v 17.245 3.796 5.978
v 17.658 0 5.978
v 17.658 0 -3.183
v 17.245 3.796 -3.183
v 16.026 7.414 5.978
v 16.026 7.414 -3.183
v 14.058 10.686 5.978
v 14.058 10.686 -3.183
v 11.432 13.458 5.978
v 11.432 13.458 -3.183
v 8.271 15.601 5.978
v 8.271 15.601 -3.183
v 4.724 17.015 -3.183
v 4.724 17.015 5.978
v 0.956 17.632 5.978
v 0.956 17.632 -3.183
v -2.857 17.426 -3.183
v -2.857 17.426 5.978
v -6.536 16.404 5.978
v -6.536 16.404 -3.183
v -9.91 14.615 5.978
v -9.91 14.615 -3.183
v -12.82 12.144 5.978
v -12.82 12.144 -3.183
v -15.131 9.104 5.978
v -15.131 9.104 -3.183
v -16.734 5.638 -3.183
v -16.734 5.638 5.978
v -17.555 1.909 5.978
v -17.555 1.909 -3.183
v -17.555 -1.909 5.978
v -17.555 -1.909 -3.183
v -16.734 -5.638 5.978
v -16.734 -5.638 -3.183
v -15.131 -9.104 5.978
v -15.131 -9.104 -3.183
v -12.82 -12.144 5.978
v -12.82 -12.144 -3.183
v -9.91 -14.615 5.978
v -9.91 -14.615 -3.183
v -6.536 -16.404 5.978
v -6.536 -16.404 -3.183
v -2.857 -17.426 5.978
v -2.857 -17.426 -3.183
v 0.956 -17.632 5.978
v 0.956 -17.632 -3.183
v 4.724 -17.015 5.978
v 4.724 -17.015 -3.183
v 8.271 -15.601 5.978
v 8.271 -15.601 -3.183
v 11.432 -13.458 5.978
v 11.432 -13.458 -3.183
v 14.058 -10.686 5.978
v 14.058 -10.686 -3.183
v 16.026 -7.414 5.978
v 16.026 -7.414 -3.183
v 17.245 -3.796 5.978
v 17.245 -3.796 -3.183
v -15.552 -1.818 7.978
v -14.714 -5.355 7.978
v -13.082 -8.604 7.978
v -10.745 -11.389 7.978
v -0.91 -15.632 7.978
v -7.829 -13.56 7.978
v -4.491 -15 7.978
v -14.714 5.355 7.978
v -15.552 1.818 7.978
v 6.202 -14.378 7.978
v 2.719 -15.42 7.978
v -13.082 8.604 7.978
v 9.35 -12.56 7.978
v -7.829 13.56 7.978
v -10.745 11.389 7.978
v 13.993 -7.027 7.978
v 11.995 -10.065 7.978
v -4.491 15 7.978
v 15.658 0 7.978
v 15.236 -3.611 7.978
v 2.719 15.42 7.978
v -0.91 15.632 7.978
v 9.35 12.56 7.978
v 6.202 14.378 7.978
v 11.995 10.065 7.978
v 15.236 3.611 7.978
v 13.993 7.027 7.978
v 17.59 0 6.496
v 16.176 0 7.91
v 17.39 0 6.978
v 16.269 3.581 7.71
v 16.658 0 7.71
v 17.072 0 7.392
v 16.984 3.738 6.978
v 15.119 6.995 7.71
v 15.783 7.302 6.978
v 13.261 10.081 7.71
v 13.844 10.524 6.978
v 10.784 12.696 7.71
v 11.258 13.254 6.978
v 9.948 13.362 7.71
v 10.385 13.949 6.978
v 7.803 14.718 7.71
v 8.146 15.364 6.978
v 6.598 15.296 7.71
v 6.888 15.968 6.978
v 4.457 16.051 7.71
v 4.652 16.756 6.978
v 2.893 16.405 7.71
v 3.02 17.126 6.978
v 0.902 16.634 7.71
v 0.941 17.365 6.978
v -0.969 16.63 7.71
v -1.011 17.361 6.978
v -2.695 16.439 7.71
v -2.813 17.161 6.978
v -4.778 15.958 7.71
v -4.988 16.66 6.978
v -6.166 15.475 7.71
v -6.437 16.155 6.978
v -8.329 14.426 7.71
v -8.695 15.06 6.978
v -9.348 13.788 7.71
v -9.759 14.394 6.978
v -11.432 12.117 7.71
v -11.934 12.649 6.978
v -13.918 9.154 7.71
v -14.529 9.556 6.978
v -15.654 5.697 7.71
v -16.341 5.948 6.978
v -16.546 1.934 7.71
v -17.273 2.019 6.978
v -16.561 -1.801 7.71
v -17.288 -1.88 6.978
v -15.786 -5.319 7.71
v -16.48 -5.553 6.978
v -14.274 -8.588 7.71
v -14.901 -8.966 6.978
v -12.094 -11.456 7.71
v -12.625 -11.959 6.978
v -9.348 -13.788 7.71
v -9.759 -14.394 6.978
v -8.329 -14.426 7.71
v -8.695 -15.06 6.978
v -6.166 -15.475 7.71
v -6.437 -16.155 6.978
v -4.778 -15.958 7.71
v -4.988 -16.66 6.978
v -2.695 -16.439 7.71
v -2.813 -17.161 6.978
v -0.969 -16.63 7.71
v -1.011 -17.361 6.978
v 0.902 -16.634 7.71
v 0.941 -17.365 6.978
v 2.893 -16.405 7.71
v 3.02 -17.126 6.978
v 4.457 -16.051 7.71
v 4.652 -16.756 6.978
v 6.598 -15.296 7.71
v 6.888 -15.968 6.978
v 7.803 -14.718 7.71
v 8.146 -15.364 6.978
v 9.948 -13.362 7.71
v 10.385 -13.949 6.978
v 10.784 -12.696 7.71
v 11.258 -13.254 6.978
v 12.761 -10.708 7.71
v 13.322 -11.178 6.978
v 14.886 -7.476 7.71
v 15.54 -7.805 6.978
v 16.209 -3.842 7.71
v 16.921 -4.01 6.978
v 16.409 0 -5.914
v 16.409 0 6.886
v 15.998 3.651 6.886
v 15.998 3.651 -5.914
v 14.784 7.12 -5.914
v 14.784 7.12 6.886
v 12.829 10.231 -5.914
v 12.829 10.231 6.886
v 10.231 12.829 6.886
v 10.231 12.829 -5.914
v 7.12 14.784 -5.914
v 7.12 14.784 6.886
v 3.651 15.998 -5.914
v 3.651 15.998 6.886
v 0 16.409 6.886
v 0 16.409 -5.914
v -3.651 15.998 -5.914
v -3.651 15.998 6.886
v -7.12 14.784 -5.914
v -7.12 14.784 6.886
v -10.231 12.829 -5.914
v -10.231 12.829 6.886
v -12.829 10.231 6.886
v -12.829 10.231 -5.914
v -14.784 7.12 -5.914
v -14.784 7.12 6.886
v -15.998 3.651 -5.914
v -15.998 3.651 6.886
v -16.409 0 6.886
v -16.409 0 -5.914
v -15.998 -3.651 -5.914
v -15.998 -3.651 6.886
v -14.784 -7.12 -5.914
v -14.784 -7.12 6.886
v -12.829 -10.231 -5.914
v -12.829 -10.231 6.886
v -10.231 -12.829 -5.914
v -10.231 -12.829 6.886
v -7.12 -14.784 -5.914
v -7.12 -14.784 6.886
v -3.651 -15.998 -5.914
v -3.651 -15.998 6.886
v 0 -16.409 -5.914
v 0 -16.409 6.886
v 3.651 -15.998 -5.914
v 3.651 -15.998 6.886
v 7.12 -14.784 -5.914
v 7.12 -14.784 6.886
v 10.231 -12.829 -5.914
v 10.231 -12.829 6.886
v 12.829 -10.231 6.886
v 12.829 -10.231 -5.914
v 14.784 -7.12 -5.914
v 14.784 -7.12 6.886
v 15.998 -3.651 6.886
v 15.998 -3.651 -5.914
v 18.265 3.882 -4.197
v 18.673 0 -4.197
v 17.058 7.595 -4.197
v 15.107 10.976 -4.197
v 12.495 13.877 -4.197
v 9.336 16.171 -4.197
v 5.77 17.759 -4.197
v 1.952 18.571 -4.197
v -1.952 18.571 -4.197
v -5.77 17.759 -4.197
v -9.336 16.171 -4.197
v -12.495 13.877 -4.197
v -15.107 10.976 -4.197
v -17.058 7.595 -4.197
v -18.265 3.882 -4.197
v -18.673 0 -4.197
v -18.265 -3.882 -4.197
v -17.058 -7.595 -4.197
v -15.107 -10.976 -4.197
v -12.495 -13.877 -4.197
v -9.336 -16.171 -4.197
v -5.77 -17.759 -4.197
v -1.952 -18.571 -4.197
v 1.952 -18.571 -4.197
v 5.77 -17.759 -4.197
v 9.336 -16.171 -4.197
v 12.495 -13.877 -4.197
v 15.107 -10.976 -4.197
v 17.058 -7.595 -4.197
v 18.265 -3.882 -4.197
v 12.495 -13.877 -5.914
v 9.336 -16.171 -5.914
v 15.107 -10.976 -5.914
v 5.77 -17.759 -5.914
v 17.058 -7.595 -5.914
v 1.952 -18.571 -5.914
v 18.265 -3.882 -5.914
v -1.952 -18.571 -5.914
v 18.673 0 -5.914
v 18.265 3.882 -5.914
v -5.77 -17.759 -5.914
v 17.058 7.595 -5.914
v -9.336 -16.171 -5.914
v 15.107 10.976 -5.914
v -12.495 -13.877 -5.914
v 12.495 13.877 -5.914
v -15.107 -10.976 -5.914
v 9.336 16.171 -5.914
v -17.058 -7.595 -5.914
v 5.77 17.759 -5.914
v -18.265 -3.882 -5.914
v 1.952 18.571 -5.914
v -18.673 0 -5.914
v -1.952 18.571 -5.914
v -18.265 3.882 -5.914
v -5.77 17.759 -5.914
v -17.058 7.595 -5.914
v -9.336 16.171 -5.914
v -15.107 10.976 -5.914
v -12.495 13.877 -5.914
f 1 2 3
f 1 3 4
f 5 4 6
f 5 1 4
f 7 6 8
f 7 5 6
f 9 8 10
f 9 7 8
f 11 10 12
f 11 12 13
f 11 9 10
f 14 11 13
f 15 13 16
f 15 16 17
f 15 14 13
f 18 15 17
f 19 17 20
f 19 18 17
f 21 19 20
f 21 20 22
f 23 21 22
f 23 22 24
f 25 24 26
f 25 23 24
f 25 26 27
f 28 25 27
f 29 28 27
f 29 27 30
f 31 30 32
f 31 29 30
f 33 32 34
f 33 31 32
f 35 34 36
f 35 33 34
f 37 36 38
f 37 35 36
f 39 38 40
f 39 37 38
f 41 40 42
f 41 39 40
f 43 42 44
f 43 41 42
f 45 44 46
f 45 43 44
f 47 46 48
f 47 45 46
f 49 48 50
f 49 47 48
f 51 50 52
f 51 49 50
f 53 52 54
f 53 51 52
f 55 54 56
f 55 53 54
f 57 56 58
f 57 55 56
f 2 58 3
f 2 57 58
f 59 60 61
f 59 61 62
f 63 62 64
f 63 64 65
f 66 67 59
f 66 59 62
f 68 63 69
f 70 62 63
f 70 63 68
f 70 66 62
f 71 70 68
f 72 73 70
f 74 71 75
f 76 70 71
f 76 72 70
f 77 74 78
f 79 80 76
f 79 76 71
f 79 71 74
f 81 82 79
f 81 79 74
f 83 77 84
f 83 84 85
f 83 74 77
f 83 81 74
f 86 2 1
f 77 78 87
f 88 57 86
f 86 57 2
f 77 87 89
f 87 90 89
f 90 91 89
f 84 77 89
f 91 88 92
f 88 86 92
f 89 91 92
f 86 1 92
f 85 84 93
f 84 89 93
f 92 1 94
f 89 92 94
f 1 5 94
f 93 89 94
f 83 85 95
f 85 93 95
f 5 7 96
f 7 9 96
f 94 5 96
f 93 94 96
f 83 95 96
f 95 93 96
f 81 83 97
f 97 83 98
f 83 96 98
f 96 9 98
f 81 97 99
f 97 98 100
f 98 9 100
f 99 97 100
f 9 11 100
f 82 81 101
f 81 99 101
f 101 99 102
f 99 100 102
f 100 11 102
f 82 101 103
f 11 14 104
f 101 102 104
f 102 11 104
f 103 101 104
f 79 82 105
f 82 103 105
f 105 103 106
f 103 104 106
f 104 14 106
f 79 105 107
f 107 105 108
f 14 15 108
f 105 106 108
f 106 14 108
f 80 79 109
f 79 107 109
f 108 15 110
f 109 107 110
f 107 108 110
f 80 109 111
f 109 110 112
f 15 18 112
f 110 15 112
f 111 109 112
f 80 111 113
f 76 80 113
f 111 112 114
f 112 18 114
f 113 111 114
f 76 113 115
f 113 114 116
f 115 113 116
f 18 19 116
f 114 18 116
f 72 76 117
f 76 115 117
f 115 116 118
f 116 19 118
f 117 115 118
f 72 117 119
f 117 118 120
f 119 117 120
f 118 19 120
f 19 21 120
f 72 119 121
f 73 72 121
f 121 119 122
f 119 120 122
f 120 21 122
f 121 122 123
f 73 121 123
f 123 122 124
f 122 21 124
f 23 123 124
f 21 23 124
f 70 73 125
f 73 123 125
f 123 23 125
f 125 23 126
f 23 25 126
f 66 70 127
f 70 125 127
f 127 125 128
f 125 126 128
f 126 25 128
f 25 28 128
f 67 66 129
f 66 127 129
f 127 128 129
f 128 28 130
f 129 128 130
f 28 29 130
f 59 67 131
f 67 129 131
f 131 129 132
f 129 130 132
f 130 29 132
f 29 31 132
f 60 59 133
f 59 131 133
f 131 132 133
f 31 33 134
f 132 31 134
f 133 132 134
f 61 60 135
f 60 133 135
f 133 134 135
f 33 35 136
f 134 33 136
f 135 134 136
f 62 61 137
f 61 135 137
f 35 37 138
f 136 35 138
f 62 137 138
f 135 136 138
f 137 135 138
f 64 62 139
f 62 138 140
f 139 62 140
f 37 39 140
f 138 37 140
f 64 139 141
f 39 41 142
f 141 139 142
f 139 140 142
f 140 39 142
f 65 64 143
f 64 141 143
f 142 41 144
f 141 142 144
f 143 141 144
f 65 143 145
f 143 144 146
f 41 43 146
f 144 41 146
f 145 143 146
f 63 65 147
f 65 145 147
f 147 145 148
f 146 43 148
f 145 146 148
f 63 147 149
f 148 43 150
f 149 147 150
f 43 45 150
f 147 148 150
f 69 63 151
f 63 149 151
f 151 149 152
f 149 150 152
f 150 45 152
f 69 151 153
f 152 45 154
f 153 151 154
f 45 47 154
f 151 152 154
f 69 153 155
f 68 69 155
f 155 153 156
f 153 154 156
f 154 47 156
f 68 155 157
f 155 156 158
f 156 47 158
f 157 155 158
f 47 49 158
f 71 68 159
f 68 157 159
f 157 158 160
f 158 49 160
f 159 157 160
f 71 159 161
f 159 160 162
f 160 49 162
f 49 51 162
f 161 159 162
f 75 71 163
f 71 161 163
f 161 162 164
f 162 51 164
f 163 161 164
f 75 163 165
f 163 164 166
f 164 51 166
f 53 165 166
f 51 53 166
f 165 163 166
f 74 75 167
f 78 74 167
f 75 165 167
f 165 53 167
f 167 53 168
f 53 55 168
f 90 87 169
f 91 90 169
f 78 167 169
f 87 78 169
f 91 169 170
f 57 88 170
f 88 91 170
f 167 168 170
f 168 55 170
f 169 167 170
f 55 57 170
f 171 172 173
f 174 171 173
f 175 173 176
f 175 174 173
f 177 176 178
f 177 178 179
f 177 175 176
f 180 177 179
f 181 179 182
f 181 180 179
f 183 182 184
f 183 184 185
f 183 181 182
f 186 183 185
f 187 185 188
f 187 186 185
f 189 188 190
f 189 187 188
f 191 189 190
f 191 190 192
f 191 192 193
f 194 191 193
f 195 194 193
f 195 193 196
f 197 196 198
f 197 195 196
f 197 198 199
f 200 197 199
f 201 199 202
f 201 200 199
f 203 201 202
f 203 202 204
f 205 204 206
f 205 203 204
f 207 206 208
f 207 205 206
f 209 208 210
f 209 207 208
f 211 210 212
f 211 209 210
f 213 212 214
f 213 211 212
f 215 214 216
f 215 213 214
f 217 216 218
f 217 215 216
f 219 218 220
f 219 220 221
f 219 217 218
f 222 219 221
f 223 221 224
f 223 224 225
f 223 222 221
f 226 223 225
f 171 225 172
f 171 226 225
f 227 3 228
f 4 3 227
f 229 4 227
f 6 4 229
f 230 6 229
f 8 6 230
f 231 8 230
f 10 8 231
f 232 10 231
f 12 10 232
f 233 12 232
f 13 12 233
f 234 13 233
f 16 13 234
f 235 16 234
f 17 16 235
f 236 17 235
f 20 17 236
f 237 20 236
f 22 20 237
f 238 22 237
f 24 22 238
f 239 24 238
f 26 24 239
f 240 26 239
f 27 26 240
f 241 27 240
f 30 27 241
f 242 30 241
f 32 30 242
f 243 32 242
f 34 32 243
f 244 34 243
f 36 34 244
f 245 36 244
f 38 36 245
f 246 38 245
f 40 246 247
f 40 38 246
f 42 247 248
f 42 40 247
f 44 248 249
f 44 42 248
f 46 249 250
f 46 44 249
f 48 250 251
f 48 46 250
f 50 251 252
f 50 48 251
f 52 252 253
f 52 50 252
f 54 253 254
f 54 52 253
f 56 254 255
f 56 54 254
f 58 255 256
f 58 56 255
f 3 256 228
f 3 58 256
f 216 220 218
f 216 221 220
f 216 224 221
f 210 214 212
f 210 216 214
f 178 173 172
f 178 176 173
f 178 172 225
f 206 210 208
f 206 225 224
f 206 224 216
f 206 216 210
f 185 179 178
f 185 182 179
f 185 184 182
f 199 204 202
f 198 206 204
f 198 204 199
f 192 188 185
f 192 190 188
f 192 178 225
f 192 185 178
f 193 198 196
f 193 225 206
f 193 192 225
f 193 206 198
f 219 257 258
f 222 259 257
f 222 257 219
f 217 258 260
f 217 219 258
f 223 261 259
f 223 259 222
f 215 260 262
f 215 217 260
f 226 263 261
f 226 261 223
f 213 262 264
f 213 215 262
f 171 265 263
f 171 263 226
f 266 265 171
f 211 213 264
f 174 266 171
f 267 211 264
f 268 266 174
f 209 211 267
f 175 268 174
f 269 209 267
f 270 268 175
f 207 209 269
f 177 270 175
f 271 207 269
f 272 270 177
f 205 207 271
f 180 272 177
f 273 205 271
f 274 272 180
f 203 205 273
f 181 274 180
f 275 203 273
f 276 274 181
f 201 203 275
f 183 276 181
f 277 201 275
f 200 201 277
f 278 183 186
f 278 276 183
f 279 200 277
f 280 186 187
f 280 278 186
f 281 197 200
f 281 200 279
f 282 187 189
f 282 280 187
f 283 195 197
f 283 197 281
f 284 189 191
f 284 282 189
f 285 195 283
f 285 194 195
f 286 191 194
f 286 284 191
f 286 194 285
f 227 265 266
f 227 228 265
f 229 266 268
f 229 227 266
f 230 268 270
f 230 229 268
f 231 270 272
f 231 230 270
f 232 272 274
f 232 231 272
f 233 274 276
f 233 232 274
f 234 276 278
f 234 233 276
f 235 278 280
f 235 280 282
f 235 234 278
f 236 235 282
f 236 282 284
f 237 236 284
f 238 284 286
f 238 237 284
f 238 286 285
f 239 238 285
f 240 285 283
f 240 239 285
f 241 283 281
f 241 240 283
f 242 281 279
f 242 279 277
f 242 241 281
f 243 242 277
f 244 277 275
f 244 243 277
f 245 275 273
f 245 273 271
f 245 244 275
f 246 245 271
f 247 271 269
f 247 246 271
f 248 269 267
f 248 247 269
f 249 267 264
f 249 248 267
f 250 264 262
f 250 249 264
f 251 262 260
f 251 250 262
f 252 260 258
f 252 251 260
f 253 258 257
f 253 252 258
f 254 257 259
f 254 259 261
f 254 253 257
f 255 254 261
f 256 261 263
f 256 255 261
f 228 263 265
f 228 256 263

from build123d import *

# Parameters (mm, degrees)
F2_R = 2


with BuildPart() as f1:
    # F0 (on Front) → F1 (revolve)
    with BuildSketch(Plane.XZ):
        Polygon((17.658173, 7.978278), (1.658173, 7.978278), (0, 7.978278), (0, 6.885595), (1.502076, 6.885595), (16.409393, 6.885595), (16.409393, -5.914406), (18.672808, -5.914406), (18.672808, -4.197333), (17.658173, -3.182699), align=None)
    revolve(axis=Axis((0, 0, 7.431936), (0, 0, 1)))

    # F2
    f2_edges = [f1.edges().sort_by_distance(p)[0] for p in [
        (-17.658173, 0, 7.978278),
    ]]
    fillet(f2_edges, radius=F2_R)


solid = f1.part
